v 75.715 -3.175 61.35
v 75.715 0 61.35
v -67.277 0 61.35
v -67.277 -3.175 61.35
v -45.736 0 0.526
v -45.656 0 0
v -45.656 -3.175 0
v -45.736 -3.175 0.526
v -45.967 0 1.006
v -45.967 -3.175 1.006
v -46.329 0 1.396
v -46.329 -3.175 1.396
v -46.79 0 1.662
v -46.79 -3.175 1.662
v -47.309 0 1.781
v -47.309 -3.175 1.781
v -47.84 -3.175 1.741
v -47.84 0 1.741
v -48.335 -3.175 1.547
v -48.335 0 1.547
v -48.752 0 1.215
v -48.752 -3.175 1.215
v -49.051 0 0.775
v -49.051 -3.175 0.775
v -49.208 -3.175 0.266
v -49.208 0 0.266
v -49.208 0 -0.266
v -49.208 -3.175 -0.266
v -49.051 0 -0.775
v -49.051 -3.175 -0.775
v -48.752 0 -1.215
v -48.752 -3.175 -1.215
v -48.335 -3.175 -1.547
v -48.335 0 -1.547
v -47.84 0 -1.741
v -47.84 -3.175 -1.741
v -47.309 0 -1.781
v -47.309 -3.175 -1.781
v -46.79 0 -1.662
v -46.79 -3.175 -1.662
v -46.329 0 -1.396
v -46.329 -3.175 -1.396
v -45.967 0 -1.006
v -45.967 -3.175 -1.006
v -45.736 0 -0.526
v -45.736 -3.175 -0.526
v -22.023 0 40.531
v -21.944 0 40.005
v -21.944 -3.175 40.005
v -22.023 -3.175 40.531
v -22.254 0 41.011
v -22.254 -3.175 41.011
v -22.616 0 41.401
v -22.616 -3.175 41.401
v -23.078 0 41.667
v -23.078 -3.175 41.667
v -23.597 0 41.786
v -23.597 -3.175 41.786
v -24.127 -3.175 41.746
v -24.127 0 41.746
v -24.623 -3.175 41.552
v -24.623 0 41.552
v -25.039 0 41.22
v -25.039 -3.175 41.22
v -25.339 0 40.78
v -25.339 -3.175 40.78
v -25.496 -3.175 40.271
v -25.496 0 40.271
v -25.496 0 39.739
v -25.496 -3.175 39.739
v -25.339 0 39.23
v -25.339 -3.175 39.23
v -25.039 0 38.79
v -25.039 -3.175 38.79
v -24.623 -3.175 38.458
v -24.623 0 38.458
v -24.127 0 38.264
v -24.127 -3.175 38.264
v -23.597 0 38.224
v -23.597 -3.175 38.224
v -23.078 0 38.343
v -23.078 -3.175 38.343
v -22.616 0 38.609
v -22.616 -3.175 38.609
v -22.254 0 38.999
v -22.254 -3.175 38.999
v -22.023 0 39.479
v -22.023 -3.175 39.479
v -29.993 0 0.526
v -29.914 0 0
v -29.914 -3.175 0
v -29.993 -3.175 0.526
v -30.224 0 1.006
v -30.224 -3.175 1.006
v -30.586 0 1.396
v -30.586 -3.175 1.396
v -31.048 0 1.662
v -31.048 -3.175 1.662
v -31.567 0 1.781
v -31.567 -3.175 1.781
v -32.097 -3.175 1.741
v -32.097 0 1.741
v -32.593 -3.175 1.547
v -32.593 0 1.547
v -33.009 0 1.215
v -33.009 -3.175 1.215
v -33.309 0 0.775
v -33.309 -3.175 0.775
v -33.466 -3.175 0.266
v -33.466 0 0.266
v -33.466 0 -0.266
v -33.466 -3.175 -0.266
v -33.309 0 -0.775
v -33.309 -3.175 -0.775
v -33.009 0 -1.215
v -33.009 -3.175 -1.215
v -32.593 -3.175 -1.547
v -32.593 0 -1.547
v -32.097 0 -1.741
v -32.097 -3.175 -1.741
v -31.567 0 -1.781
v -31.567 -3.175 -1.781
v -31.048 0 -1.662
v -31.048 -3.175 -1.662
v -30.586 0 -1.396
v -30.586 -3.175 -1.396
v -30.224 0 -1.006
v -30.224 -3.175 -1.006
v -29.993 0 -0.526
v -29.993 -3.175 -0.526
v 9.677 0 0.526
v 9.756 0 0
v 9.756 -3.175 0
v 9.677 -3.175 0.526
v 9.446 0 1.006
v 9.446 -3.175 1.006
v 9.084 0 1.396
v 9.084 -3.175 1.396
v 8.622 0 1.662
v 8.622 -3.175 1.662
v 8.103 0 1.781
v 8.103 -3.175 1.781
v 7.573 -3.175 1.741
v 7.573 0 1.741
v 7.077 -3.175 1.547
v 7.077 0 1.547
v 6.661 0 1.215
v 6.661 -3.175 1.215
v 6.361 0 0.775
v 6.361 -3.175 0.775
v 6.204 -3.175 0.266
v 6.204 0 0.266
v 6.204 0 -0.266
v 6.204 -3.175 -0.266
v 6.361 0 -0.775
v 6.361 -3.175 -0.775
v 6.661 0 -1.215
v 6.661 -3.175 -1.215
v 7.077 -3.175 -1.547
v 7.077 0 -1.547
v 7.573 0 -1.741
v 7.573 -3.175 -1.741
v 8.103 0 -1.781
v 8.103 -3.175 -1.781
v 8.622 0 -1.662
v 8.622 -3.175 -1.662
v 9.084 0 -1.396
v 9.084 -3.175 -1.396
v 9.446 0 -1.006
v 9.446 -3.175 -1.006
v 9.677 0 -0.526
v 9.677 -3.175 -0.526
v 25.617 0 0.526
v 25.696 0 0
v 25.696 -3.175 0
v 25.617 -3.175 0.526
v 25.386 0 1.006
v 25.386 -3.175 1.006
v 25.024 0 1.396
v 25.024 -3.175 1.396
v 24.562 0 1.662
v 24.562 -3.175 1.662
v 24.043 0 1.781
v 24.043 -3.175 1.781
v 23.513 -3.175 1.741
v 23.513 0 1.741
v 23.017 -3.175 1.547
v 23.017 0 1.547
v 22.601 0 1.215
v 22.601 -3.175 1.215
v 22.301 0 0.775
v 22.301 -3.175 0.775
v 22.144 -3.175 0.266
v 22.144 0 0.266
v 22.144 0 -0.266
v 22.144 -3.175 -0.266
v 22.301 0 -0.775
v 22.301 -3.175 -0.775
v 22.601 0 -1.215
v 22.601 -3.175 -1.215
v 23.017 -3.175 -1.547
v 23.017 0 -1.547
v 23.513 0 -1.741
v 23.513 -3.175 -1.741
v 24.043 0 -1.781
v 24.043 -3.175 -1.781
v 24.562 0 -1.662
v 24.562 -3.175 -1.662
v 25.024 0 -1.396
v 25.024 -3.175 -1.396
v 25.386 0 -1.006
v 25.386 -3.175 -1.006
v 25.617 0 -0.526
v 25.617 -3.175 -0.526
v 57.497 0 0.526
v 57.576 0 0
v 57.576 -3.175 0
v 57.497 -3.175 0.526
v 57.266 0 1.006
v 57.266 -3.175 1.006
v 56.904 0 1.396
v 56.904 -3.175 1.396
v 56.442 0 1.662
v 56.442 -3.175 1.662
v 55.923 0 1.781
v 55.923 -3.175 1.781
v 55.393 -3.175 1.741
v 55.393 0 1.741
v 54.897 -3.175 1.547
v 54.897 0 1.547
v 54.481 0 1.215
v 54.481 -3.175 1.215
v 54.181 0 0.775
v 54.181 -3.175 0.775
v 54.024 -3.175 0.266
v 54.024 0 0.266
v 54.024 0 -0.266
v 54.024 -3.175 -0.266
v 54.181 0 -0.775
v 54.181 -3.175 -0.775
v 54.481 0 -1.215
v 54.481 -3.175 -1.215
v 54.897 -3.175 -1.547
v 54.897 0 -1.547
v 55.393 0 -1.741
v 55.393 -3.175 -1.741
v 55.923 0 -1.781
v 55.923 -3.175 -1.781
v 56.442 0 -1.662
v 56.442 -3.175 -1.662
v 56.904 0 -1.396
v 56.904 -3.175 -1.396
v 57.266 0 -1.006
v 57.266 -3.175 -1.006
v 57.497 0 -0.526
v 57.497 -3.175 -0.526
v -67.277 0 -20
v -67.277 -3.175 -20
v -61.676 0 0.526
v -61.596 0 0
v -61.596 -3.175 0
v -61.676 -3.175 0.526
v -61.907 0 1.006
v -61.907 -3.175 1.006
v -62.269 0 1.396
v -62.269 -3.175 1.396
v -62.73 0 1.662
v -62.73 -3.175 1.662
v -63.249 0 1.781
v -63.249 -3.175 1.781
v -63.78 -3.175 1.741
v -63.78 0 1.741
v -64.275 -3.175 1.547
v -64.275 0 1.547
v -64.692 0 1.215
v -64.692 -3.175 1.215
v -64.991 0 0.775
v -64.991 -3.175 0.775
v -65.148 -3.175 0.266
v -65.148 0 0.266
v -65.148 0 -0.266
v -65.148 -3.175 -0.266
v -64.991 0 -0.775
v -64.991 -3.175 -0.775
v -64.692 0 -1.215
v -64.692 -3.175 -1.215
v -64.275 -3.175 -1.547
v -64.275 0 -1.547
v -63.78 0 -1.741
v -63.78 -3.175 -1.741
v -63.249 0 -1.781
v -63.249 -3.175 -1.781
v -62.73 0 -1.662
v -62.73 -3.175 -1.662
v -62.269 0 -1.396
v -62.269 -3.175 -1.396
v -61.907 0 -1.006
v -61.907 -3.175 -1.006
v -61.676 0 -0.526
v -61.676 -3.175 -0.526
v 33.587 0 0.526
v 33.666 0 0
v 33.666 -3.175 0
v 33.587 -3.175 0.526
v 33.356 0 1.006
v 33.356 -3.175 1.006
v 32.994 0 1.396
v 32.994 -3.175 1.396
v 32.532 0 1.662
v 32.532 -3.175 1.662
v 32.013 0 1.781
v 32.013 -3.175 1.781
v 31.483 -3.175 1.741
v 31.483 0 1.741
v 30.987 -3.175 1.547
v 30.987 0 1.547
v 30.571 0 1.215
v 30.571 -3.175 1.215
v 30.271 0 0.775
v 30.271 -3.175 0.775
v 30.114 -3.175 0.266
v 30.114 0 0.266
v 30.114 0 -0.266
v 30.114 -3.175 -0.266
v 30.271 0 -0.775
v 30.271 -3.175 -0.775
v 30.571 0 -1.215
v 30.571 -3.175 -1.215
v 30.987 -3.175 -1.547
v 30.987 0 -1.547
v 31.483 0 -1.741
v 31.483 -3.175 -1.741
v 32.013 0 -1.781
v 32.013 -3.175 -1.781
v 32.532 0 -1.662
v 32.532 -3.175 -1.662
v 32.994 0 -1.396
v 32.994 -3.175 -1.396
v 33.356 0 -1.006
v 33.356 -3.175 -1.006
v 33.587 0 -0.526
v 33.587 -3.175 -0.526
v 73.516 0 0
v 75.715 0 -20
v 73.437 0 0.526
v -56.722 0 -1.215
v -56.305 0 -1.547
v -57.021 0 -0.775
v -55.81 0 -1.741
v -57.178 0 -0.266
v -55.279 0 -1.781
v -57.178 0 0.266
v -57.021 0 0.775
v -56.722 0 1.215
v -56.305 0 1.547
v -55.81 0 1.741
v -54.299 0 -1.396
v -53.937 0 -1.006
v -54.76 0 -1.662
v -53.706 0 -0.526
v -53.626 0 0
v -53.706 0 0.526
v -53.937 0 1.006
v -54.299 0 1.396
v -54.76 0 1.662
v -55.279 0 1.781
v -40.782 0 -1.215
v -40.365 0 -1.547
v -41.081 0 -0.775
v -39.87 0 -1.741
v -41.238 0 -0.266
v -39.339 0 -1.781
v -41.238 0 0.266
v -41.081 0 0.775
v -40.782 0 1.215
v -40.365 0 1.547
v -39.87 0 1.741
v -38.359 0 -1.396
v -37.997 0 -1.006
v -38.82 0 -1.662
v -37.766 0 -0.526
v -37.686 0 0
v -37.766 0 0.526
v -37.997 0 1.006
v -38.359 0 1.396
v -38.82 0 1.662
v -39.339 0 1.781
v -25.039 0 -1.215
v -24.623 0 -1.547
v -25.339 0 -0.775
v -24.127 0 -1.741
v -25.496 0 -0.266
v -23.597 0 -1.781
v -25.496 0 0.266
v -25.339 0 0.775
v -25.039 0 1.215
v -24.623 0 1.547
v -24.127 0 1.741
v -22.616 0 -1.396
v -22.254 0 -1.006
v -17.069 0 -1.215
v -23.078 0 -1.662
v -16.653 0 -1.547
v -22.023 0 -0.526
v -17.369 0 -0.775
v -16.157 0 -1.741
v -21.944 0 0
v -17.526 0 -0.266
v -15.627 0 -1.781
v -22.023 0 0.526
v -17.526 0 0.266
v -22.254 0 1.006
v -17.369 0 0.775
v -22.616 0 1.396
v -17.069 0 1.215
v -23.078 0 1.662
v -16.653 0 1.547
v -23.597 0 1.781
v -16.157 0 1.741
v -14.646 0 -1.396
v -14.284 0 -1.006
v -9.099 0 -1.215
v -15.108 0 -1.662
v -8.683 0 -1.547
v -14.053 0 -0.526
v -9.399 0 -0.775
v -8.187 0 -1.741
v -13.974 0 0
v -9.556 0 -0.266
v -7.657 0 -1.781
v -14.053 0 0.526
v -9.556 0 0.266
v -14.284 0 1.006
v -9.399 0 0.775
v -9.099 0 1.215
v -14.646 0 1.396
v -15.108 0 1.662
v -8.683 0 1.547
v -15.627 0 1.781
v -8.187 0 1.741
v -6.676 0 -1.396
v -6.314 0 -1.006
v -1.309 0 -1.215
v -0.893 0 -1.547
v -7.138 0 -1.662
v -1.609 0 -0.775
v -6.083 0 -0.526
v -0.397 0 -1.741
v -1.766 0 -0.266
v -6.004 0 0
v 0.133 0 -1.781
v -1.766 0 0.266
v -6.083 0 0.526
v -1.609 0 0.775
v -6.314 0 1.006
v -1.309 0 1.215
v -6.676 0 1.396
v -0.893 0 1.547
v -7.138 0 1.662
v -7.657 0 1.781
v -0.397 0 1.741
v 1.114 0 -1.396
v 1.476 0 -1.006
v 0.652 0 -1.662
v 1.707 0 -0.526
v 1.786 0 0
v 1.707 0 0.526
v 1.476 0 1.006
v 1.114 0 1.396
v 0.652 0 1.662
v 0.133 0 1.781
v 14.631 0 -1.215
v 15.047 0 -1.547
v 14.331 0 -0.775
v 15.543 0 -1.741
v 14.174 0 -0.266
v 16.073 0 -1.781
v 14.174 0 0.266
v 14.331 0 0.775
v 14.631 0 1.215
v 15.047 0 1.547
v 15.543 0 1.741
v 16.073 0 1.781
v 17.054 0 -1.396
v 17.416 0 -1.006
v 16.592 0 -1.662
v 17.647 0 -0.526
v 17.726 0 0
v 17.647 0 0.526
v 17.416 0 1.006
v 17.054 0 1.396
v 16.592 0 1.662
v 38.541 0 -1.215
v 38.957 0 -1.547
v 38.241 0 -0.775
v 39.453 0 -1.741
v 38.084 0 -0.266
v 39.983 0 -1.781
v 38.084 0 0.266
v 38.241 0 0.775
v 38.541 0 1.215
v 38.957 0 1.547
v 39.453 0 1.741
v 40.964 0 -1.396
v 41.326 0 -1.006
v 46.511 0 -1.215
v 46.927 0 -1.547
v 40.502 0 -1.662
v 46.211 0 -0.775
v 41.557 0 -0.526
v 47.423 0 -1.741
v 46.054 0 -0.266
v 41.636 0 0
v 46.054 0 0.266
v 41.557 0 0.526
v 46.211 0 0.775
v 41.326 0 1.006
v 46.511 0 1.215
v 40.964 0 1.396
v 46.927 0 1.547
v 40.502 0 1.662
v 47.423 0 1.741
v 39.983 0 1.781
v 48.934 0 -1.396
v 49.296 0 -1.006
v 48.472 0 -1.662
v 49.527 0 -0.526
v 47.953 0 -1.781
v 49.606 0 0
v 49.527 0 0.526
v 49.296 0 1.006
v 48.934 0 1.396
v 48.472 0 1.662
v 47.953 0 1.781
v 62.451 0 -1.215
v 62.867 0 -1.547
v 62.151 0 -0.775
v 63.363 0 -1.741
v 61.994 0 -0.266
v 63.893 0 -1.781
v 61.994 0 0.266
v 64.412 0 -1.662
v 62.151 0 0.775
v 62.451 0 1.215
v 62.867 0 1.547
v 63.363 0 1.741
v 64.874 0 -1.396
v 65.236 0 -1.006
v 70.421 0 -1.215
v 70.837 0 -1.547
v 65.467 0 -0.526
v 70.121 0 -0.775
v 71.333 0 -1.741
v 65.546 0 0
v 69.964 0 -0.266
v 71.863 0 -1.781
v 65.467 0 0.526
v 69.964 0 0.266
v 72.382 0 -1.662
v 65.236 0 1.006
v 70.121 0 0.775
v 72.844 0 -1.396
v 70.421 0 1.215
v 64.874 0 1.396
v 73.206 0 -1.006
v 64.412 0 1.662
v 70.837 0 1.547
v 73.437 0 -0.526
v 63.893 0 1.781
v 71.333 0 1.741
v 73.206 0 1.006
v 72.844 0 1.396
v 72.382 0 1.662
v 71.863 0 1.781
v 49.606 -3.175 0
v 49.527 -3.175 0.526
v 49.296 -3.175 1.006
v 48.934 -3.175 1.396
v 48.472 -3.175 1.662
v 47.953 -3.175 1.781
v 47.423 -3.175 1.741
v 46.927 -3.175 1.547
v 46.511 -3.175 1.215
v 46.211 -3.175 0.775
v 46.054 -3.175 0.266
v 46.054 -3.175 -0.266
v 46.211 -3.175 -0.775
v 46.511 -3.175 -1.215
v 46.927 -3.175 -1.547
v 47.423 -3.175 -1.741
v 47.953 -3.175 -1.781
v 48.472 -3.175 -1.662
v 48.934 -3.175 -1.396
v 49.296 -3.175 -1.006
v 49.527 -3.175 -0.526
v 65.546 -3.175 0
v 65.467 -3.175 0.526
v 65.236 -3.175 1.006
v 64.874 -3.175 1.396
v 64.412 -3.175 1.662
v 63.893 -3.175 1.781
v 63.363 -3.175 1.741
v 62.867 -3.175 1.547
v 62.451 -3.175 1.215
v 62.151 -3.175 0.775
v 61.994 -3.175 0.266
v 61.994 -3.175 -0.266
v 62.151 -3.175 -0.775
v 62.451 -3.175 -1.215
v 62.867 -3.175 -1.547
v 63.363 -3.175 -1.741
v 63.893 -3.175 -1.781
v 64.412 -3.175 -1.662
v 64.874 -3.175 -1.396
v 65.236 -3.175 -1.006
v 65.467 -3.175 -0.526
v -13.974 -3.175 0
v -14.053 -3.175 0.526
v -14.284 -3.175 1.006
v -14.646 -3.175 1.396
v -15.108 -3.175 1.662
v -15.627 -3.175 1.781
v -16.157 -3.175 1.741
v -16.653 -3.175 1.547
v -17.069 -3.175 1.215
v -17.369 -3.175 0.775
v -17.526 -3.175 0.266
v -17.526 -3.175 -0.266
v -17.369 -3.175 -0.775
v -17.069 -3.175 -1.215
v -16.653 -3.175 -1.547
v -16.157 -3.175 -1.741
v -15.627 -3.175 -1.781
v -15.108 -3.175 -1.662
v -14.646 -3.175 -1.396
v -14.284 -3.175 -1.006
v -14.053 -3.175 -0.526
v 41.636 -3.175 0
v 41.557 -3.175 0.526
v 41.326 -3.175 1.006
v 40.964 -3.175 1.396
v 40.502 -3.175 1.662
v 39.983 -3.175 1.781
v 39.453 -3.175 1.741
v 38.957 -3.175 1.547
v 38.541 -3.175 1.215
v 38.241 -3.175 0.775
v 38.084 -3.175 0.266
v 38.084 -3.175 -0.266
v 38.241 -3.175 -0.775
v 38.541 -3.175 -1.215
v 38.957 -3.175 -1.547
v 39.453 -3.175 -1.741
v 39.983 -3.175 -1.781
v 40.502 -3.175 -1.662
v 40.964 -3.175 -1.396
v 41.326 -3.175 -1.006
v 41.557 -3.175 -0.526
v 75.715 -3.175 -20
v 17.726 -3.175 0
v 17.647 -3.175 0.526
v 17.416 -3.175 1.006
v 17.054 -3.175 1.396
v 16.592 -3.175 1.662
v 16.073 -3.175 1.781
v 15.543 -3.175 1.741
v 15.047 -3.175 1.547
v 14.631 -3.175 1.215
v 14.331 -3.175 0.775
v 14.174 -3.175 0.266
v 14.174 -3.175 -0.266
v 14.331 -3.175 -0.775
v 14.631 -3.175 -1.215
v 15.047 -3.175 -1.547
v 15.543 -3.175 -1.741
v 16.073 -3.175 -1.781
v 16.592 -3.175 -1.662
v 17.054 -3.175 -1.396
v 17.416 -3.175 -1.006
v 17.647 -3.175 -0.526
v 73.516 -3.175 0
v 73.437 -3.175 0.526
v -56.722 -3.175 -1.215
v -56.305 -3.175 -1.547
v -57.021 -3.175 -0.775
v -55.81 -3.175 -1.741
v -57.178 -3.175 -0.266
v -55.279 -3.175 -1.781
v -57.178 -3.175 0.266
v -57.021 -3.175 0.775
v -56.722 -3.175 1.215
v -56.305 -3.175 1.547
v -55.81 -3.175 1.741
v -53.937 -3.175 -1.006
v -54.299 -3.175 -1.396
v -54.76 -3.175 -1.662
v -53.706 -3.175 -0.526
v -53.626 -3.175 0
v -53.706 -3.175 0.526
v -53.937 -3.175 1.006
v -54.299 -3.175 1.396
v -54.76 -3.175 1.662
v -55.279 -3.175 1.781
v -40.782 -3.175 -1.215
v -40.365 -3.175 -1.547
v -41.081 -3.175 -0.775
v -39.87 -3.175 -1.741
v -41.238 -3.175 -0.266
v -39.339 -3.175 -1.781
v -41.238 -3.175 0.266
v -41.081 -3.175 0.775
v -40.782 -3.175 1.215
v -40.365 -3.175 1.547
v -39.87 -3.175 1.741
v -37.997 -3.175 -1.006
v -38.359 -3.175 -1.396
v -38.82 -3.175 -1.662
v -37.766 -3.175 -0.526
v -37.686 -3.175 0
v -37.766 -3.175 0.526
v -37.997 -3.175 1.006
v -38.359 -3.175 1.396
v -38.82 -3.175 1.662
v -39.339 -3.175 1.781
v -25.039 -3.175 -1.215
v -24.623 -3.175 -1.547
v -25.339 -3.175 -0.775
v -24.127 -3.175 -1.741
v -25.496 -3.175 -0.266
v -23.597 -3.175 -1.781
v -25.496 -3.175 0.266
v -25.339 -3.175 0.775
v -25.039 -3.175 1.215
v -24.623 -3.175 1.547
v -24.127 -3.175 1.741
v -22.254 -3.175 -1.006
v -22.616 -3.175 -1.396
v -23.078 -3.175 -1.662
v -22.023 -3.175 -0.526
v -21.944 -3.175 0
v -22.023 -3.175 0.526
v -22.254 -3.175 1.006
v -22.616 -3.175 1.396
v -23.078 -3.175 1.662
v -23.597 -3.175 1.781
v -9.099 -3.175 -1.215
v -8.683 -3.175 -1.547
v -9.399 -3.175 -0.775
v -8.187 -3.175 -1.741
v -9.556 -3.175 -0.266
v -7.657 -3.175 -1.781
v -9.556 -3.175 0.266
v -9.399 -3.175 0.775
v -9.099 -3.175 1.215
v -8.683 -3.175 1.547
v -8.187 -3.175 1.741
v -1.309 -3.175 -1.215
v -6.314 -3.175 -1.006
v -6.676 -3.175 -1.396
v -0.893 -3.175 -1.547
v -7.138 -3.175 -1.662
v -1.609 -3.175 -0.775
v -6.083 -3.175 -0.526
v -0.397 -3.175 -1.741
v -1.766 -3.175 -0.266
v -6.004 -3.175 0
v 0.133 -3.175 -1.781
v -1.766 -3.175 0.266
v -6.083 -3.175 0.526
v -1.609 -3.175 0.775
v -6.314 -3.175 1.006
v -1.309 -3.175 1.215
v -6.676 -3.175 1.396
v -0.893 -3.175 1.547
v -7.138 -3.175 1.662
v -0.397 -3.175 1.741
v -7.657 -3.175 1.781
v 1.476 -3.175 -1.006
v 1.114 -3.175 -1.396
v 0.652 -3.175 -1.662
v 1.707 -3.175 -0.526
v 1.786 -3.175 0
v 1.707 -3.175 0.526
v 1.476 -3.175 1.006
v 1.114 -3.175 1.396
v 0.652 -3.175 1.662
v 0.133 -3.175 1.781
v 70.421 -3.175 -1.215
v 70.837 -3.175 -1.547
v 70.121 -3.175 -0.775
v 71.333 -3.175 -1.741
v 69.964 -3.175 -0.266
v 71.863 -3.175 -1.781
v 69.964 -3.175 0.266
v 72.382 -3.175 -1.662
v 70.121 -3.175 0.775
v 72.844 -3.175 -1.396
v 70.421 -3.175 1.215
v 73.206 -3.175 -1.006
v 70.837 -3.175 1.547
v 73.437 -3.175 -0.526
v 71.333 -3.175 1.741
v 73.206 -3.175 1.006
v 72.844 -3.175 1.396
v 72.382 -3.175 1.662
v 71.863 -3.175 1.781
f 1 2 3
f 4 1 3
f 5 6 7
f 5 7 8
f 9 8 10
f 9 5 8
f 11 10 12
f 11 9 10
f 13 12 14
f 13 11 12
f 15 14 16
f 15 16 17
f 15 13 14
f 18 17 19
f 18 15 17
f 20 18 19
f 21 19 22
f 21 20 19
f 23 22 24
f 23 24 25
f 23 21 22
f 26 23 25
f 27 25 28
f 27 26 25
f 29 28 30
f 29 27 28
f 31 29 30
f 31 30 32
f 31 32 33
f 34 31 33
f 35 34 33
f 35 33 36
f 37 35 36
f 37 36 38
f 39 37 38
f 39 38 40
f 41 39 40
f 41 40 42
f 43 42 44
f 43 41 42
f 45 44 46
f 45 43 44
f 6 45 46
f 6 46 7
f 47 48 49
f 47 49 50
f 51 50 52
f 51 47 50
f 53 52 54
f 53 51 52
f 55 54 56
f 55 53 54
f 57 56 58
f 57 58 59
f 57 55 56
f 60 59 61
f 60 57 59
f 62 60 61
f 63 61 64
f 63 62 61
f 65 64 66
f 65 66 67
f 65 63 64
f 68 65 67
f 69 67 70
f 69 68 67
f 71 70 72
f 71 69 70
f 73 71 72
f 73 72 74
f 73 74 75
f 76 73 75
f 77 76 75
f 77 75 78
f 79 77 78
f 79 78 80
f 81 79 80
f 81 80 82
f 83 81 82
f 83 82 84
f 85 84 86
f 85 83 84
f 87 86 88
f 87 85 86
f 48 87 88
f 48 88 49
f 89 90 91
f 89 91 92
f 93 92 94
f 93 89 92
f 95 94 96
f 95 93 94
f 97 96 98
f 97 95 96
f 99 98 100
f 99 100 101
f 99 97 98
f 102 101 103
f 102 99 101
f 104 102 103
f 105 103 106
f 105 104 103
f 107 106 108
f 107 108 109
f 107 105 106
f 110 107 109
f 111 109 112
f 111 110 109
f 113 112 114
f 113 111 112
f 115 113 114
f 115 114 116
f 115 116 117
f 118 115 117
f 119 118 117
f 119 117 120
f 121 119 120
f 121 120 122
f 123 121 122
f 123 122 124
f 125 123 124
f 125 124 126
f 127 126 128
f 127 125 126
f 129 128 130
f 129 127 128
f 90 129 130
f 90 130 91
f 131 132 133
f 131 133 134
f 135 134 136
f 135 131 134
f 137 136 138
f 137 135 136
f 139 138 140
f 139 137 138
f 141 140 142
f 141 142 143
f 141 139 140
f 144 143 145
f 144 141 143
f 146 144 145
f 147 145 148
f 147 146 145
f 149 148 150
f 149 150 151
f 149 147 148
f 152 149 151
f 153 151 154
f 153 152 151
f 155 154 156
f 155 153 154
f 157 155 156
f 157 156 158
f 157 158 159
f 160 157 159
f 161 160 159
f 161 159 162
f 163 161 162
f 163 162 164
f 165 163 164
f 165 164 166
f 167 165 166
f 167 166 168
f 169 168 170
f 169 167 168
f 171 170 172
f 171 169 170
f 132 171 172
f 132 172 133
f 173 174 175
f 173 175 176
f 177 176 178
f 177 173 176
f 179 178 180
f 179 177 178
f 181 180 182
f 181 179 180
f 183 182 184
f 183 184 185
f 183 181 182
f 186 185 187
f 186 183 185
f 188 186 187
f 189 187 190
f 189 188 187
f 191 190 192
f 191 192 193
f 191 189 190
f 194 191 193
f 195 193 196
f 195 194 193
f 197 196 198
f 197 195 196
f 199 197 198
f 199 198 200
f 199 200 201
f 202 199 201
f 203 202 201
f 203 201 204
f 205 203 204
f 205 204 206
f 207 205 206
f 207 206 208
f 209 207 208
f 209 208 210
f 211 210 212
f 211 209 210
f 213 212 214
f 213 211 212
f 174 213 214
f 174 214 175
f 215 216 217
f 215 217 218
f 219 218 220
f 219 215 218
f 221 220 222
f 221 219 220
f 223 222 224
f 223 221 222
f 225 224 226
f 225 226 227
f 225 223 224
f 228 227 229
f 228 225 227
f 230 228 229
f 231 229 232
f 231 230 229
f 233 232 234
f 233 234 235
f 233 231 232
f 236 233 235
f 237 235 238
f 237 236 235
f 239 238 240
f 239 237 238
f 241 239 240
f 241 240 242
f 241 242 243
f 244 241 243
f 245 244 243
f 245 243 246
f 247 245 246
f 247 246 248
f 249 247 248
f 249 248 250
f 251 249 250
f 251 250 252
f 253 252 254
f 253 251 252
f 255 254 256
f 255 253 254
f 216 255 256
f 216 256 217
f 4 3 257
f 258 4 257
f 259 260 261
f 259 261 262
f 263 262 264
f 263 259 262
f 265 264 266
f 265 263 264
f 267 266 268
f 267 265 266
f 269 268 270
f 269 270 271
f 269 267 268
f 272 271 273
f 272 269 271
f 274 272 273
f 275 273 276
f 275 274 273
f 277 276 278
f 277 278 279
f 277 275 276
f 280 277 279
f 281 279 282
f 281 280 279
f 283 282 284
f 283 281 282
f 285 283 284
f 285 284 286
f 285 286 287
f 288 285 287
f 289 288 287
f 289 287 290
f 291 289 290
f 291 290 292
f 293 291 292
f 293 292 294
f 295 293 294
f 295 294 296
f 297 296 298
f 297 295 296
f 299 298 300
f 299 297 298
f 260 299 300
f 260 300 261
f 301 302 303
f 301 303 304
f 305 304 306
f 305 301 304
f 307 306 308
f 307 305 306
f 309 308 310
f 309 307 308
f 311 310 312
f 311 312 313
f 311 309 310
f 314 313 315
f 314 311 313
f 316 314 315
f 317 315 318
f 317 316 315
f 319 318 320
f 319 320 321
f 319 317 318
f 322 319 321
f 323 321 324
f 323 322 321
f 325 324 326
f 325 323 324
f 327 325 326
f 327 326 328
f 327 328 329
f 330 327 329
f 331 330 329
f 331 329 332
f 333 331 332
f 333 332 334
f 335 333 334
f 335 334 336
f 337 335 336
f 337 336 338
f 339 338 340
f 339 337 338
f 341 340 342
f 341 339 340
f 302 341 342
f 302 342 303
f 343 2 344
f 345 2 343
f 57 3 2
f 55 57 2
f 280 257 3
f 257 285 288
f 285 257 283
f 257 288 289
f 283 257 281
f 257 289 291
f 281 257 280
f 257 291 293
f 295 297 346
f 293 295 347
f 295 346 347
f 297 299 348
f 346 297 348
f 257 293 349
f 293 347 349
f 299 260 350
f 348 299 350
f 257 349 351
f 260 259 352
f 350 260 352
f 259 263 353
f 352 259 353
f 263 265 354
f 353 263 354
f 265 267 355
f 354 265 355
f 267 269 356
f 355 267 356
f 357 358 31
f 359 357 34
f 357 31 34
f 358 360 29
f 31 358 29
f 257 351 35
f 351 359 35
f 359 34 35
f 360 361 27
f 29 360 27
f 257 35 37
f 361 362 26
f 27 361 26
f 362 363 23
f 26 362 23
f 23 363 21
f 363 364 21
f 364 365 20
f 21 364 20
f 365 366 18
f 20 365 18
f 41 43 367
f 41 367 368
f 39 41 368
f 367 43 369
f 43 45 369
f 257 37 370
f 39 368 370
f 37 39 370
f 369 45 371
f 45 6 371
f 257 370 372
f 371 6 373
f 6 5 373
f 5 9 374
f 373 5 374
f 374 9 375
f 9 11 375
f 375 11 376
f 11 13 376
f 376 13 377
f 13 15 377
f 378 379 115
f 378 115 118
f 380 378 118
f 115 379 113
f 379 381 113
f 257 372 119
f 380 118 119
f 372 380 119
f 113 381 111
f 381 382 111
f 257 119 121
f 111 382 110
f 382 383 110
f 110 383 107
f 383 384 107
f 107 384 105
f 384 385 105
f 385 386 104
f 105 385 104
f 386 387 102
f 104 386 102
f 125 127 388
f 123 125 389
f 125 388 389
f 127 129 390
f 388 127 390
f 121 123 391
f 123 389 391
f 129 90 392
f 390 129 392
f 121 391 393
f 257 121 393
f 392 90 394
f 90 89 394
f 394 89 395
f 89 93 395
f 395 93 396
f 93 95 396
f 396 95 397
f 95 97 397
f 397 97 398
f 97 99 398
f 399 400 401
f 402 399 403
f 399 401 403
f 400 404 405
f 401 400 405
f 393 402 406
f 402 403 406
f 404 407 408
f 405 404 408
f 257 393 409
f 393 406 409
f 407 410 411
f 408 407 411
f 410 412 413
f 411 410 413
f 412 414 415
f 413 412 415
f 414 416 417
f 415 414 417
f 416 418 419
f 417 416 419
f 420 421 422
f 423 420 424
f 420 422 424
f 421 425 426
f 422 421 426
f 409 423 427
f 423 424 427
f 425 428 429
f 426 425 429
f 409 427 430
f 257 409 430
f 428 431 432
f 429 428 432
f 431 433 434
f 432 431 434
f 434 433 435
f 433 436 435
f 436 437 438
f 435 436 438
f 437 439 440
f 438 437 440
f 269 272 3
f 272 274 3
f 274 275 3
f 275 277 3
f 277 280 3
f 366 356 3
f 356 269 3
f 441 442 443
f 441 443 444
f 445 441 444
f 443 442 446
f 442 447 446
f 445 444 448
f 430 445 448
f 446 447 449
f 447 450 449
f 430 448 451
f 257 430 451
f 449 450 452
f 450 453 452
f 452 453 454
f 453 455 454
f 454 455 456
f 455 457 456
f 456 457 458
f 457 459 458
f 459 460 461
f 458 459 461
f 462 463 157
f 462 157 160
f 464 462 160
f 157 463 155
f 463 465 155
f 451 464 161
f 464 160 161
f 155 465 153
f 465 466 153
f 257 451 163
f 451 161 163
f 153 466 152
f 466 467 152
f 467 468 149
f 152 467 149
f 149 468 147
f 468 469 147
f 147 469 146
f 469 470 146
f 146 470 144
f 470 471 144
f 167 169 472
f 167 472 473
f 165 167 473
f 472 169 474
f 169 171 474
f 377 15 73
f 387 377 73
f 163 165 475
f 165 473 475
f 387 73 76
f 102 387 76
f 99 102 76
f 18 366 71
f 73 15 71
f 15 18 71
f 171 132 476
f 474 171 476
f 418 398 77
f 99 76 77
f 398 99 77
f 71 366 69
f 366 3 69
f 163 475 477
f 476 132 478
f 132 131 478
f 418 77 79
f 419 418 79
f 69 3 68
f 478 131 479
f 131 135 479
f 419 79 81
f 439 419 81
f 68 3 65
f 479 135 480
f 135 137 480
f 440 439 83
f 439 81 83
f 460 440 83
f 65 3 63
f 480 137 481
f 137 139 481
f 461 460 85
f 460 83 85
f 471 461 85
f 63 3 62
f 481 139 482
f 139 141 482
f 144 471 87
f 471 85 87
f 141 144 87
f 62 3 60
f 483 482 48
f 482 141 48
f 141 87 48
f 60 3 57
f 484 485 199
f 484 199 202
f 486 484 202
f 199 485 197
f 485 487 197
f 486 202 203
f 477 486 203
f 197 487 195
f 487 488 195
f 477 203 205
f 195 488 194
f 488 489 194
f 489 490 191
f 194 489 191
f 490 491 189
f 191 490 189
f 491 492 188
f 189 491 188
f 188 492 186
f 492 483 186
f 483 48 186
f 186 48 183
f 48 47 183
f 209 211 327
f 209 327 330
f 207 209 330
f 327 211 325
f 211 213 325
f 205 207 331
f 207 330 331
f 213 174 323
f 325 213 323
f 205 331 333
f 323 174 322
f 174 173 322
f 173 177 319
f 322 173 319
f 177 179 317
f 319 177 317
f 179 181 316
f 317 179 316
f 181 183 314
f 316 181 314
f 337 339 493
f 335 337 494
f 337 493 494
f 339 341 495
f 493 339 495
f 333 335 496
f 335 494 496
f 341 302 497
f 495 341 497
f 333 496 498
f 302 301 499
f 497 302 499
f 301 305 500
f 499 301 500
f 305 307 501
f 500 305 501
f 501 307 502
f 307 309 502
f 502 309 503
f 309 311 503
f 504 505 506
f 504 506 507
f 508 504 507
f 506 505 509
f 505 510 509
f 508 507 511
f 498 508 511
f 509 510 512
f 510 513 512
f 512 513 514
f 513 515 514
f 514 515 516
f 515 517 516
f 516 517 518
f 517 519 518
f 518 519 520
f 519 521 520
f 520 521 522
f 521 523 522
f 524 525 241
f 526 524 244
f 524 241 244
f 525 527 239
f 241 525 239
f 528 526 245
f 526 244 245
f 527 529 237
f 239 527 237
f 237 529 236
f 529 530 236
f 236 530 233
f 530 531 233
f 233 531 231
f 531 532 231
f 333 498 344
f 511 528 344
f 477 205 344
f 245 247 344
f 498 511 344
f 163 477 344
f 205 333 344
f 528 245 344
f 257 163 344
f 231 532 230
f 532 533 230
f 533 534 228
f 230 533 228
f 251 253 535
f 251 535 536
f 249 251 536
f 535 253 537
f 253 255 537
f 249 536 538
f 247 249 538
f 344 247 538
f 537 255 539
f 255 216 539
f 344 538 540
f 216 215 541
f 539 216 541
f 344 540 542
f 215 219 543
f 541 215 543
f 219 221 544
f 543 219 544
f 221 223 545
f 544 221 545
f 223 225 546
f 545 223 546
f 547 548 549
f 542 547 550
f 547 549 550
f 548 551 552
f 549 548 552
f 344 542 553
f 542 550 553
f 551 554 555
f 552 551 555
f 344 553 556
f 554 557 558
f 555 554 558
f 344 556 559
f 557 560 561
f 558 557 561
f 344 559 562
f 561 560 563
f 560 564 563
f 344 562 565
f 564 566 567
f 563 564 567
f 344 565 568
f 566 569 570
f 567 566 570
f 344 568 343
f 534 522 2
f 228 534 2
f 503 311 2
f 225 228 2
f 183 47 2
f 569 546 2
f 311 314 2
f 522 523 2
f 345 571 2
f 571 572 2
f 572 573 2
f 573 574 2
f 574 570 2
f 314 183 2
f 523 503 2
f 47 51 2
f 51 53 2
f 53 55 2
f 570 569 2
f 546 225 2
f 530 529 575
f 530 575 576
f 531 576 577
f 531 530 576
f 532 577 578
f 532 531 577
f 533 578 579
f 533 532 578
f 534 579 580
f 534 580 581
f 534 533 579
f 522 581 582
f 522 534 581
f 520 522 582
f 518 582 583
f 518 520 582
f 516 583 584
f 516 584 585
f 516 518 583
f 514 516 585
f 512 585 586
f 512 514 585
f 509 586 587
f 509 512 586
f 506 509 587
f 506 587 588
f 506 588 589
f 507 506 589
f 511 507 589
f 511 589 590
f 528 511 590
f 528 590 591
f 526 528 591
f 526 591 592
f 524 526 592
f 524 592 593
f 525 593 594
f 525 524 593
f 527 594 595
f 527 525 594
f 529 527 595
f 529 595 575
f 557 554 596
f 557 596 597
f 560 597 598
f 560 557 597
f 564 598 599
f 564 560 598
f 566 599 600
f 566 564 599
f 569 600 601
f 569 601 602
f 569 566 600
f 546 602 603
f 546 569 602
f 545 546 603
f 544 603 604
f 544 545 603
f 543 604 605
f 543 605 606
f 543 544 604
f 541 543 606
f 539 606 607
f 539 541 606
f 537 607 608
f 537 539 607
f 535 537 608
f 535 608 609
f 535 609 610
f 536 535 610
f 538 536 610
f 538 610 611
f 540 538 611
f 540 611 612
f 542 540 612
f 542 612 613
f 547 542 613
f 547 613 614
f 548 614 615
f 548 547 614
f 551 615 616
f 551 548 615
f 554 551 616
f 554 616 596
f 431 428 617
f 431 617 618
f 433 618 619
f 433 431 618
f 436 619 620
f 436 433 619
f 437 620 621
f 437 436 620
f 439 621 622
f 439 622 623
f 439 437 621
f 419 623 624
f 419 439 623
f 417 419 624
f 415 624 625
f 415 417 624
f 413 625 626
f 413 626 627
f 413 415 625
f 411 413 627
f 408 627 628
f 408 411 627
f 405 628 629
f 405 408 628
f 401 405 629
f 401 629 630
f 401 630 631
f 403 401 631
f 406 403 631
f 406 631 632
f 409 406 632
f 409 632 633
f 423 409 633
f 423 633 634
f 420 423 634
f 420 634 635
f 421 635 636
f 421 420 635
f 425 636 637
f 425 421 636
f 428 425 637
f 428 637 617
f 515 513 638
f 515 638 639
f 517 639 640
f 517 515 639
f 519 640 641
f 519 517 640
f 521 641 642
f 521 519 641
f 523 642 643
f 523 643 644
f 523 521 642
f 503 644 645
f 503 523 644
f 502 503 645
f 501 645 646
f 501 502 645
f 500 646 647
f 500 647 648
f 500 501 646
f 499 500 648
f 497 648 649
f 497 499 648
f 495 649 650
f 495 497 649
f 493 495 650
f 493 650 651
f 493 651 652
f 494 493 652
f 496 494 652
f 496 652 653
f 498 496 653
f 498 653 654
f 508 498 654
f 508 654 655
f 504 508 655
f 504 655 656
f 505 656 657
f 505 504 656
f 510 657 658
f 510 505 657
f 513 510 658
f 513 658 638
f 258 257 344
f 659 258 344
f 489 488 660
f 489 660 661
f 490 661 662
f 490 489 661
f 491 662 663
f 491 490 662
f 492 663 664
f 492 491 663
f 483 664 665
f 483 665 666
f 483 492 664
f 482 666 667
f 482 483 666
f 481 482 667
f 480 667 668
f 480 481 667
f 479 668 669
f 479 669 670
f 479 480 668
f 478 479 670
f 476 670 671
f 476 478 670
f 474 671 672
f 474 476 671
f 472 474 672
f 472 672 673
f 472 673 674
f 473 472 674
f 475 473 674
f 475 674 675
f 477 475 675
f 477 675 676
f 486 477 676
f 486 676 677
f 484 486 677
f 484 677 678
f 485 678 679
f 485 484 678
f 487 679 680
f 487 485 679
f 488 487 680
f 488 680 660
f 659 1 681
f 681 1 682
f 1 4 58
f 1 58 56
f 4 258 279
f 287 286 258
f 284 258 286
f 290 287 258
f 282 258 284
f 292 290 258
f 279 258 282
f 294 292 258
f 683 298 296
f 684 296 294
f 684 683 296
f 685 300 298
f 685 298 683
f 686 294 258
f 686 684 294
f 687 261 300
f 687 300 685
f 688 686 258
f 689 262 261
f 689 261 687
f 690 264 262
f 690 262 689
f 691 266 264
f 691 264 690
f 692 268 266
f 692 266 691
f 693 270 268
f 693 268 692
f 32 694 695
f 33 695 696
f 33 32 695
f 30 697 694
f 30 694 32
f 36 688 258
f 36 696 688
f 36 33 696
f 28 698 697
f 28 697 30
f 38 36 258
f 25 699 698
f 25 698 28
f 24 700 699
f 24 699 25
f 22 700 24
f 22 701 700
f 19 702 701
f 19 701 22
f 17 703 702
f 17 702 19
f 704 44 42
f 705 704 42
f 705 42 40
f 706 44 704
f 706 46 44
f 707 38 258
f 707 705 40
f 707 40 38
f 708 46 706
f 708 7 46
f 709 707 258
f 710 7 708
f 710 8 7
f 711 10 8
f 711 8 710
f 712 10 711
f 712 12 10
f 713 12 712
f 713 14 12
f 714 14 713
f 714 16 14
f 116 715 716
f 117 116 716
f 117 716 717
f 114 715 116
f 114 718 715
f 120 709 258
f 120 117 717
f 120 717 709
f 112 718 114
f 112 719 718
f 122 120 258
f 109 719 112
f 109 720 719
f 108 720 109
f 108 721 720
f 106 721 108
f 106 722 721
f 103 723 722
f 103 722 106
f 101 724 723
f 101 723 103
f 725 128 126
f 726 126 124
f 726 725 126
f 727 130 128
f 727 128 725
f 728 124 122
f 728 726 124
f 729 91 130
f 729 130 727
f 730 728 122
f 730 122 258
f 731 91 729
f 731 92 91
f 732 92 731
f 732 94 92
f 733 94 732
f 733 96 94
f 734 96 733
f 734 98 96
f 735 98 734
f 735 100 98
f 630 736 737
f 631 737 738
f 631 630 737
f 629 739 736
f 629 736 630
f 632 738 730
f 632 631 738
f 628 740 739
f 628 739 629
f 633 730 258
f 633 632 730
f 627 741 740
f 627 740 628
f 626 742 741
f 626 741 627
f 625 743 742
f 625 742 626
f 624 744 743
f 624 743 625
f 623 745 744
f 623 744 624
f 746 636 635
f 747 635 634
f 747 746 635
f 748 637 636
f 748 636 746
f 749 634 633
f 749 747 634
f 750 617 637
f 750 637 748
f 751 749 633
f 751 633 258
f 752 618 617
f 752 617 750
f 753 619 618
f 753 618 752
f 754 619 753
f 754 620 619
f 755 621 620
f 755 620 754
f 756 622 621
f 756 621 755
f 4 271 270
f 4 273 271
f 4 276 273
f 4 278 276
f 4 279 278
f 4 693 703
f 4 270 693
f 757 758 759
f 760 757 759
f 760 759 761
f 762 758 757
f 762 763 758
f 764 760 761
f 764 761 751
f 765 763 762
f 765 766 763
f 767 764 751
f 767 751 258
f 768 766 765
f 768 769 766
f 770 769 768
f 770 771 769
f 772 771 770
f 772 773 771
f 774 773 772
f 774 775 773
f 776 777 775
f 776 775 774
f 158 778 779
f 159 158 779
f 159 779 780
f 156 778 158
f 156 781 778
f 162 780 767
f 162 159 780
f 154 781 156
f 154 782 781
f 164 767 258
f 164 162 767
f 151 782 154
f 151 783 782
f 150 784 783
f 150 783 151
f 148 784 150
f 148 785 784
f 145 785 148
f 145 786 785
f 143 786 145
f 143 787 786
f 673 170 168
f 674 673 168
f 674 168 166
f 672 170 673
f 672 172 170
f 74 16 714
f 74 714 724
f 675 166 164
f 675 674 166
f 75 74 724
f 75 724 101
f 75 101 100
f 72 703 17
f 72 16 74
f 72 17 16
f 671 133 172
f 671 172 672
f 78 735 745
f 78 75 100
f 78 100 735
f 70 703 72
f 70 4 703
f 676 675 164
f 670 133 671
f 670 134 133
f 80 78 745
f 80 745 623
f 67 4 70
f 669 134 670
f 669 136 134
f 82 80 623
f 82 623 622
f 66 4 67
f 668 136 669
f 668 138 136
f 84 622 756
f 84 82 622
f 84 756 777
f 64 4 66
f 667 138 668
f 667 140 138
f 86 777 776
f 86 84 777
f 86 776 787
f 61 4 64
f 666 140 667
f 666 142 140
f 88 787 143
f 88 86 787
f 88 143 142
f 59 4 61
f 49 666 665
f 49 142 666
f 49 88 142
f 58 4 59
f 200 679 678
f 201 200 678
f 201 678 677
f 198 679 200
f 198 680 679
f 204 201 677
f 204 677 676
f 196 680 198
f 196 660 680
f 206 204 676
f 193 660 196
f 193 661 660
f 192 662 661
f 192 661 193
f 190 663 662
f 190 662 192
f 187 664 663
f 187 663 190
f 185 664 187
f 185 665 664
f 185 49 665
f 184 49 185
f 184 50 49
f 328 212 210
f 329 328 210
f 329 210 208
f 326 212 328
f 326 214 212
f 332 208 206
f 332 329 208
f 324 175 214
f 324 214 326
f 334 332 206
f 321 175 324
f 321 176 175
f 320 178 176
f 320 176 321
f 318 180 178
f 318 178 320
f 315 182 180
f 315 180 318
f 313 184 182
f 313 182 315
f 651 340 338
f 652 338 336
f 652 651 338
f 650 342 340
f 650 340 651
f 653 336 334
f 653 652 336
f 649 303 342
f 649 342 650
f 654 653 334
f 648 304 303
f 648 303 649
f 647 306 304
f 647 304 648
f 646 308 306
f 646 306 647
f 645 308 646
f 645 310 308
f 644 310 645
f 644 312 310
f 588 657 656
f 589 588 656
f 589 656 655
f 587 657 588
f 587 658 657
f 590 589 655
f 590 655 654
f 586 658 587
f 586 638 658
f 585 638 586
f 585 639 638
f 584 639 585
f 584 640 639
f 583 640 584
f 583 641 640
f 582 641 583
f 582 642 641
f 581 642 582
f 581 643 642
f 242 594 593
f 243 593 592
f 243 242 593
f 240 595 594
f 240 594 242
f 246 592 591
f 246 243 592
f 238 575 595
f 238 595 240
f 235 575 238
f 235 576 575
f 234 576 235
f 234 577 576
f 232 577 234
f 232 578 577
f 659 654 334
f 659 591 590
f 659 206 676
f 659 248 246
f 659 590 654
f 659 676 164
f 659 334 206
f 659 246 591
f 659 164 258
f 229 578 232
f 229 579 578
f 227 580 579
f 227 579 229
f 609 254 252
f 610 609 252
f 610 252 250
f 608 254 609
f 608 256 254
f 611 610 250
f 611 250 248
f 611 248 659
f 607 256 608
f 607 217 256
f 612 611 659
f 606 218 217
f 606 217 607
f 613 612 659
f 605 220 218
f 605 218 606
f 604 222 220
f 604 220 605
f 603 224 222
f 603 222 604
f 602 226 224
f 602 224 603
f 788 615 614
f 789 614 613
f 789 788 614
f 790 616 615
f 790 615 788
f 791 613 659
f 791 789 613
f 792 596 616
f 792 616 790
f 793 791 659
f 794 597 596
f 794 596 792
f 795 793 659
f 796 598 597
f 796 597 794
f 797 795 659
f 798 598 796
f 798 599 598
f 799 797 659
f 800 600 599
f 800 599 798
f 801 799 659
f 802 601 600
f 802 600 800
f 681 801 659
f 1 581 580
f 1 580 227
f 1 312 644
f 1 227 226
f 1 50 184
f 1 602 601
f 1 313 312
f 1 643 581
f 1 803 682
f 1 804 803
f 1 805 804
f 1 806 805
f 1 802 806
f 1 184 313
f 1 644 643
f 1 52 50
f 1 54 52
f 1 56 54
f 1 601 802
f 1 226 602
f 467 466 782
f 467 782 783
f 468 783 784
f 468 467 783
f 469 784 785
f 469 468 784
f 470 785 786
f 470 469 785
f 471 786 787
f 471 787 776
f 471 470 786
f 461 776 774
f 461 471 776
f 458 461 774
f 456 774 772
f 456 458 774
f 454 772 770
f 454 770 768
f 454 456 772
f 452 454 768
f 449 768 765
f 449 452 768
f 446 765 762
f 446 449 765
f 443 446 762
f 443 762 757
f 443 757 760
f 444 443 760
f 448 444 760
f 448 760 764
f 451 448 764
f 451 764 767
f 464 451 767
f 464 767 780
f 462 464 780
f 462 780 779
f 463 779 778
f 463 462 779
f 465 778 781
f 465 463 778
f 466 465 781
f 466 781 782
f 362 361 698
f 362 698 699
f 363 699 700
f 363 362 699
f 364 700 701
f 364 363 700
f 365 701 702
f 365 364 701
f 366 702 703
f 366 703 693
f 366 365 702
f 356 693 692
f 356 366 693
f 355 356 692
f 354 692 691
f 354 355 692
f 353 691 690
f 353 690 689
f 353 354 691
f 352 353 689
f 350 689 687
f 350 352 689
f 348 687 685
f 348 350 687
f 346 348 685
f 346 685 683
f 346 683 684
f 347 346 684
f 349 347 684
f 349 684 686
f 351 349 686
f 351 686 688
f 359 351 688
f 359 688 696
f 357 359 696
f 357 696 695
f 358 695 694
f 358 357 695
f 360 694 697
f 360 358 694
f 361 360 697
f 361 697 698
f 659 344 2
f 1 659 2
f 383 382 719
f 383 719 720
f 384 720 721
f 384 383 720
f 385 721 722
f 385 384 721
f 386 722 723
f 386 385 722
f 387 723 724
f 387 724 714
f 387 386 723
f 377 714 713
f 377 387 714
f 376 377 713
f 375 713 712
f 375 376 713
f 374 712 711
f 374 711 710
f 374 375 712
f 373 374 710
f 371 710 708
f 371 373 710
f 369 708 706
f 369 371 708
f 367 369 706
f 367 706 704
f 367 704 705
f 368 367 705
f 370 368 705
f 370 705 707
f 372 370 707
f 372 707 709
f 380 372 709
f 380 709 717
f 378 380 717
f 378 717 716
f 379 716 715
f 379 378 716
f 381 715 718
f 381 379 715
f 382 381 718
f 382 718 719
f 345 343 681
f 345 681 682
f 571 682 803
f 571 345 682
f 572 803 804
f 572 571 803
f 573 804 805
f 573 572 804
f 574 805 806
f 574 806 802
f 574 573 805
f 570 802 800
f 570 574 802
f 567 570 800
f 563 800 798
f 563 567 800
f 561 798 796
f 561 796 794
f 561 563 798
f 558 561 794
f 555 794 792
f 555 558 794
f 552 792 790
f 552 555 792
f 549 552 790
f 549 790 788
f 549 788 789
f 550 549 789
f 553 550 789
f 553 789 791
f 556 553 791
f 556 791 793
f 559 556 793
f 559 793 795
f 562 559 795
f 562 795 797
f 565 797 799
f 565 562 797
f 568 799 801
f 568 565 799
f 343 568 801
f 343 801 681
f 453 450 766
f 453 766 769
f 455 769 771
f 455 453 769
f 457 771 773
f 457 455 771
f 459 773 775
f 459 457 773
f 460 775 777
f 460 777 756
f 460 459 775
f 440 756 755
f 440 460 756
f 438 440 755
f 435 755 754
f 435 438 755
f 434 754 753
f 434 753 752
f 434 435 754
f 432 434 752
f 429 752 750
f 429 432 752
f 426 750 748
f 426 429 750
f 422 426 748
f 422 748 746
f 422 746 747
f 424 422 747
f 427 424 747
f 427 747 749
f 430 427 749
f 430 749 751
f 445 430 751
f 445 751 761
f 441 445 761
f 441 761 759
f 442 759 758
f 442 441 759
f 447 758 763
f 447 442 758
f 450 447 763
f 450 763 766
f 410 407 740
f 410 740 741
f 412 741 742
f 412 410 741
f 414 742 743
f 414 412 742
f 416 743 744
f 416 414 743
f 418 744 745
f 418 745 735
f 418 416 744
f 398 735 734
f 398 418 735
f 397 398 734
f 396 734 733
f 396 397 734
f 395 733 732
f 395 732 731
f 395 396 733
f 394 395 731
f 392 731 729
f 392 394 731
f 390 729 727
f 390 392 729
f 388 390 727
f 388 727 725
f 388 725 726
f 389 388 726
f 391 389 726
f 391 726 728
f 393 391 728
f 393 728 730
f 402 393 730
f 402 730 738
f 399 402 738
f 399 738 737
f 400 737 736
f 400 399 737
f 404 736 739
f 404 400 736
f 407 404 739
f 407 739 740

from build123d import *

# Parameters (mm, degrees)
F0_R     = 1.7859375
F1_DEPTH = 3.175


# Not quite as in the source:
# - a length typed as a fraction of an inch, garbled in the dataset ("3 / 203.2 mm" for 3/8 in), is restored


with BuildPart() as f1:
    # F0 (on Front) → F1 (new body)
    with BuildSketch(Plane.XZ):
        Polygon((75.715, -20), (75.715, 61.3500024), (-3.7115799668, 61.3500024), (-35.4027799668, 61.3500024), (-67.2774, 61.3500024), (-67.2774, -20), (-35.5862, -20), (-3.895, -20), align=None)
        with Locations((-63.3824, 0)):
            Circle(F0_R, mode=Mode.SUBTRACT)
        with Locations((-55.4124, 0)):
            Circle(F0_R, mode=Mode.SUBTRACT)
        with Locations((-47.4424, 0)):
            Circle(F0_R, mode=Mode.SUBTRACT)
        with Locations((-39.4724, 0)):
            Circle(F0_R, mode=Mode.SUBTRACT)
        with Locations((-31.7, 0)):
            Circle(F0_R, mode=Mode.SUBTRACT)
        with Locations((-23.73, 0)):
            Circle(F0_R, mode=Mode.SUBTRACT)
        with Locations((-15.76, 0)):
            Circle(F0_R, mode=Mode.SUBTRACT)
        with Locations((-7.79, 0)):
            Circle(F0_R, mode=Mode.SUBTRACT)
        Circle(F0_R, mode=Mode.SUBTRACT)
        with Locations((7.97, 0)):
            Circle(F0_R, mode=Mode.SUBTRACT)
        with Locations((15.94, 0)):
            Circle(F0_R, mode=Mode.SUBTRACT)
        with Locations((23.91, 0)):
            Circle(F0_R, mode=Mode.SUBTRACT)
        with Locations((31.88, 0)):
            Circle(F0_R, mode=Mode.SUBTRACT)
        with Locations((39.85, 0)):
            Circle(F0_R, mode=Mode.SUBTRACT)
        with Locations((47.82, 0)):
            Circle(F0_R, mode=Mode.SUBTRACT)
        with Locations((55.79, 0)):
            Circle(F0_R, mode=Mode.SUBTRACT)
        with Locations((63.76, 0)):
            Circle(F0_R, mode=Mode.SUBTRACT)
        with Locations((71.73, 0)):
            Circle(F0_R, mode=Mode.SUBTRACT)
        with Locations((-23.73, 40.005)):
            Circle(F0_R, mode=Mode.SUBTRACT)
    extrude(amount=F1_DEPTH)


solid = f1.part
